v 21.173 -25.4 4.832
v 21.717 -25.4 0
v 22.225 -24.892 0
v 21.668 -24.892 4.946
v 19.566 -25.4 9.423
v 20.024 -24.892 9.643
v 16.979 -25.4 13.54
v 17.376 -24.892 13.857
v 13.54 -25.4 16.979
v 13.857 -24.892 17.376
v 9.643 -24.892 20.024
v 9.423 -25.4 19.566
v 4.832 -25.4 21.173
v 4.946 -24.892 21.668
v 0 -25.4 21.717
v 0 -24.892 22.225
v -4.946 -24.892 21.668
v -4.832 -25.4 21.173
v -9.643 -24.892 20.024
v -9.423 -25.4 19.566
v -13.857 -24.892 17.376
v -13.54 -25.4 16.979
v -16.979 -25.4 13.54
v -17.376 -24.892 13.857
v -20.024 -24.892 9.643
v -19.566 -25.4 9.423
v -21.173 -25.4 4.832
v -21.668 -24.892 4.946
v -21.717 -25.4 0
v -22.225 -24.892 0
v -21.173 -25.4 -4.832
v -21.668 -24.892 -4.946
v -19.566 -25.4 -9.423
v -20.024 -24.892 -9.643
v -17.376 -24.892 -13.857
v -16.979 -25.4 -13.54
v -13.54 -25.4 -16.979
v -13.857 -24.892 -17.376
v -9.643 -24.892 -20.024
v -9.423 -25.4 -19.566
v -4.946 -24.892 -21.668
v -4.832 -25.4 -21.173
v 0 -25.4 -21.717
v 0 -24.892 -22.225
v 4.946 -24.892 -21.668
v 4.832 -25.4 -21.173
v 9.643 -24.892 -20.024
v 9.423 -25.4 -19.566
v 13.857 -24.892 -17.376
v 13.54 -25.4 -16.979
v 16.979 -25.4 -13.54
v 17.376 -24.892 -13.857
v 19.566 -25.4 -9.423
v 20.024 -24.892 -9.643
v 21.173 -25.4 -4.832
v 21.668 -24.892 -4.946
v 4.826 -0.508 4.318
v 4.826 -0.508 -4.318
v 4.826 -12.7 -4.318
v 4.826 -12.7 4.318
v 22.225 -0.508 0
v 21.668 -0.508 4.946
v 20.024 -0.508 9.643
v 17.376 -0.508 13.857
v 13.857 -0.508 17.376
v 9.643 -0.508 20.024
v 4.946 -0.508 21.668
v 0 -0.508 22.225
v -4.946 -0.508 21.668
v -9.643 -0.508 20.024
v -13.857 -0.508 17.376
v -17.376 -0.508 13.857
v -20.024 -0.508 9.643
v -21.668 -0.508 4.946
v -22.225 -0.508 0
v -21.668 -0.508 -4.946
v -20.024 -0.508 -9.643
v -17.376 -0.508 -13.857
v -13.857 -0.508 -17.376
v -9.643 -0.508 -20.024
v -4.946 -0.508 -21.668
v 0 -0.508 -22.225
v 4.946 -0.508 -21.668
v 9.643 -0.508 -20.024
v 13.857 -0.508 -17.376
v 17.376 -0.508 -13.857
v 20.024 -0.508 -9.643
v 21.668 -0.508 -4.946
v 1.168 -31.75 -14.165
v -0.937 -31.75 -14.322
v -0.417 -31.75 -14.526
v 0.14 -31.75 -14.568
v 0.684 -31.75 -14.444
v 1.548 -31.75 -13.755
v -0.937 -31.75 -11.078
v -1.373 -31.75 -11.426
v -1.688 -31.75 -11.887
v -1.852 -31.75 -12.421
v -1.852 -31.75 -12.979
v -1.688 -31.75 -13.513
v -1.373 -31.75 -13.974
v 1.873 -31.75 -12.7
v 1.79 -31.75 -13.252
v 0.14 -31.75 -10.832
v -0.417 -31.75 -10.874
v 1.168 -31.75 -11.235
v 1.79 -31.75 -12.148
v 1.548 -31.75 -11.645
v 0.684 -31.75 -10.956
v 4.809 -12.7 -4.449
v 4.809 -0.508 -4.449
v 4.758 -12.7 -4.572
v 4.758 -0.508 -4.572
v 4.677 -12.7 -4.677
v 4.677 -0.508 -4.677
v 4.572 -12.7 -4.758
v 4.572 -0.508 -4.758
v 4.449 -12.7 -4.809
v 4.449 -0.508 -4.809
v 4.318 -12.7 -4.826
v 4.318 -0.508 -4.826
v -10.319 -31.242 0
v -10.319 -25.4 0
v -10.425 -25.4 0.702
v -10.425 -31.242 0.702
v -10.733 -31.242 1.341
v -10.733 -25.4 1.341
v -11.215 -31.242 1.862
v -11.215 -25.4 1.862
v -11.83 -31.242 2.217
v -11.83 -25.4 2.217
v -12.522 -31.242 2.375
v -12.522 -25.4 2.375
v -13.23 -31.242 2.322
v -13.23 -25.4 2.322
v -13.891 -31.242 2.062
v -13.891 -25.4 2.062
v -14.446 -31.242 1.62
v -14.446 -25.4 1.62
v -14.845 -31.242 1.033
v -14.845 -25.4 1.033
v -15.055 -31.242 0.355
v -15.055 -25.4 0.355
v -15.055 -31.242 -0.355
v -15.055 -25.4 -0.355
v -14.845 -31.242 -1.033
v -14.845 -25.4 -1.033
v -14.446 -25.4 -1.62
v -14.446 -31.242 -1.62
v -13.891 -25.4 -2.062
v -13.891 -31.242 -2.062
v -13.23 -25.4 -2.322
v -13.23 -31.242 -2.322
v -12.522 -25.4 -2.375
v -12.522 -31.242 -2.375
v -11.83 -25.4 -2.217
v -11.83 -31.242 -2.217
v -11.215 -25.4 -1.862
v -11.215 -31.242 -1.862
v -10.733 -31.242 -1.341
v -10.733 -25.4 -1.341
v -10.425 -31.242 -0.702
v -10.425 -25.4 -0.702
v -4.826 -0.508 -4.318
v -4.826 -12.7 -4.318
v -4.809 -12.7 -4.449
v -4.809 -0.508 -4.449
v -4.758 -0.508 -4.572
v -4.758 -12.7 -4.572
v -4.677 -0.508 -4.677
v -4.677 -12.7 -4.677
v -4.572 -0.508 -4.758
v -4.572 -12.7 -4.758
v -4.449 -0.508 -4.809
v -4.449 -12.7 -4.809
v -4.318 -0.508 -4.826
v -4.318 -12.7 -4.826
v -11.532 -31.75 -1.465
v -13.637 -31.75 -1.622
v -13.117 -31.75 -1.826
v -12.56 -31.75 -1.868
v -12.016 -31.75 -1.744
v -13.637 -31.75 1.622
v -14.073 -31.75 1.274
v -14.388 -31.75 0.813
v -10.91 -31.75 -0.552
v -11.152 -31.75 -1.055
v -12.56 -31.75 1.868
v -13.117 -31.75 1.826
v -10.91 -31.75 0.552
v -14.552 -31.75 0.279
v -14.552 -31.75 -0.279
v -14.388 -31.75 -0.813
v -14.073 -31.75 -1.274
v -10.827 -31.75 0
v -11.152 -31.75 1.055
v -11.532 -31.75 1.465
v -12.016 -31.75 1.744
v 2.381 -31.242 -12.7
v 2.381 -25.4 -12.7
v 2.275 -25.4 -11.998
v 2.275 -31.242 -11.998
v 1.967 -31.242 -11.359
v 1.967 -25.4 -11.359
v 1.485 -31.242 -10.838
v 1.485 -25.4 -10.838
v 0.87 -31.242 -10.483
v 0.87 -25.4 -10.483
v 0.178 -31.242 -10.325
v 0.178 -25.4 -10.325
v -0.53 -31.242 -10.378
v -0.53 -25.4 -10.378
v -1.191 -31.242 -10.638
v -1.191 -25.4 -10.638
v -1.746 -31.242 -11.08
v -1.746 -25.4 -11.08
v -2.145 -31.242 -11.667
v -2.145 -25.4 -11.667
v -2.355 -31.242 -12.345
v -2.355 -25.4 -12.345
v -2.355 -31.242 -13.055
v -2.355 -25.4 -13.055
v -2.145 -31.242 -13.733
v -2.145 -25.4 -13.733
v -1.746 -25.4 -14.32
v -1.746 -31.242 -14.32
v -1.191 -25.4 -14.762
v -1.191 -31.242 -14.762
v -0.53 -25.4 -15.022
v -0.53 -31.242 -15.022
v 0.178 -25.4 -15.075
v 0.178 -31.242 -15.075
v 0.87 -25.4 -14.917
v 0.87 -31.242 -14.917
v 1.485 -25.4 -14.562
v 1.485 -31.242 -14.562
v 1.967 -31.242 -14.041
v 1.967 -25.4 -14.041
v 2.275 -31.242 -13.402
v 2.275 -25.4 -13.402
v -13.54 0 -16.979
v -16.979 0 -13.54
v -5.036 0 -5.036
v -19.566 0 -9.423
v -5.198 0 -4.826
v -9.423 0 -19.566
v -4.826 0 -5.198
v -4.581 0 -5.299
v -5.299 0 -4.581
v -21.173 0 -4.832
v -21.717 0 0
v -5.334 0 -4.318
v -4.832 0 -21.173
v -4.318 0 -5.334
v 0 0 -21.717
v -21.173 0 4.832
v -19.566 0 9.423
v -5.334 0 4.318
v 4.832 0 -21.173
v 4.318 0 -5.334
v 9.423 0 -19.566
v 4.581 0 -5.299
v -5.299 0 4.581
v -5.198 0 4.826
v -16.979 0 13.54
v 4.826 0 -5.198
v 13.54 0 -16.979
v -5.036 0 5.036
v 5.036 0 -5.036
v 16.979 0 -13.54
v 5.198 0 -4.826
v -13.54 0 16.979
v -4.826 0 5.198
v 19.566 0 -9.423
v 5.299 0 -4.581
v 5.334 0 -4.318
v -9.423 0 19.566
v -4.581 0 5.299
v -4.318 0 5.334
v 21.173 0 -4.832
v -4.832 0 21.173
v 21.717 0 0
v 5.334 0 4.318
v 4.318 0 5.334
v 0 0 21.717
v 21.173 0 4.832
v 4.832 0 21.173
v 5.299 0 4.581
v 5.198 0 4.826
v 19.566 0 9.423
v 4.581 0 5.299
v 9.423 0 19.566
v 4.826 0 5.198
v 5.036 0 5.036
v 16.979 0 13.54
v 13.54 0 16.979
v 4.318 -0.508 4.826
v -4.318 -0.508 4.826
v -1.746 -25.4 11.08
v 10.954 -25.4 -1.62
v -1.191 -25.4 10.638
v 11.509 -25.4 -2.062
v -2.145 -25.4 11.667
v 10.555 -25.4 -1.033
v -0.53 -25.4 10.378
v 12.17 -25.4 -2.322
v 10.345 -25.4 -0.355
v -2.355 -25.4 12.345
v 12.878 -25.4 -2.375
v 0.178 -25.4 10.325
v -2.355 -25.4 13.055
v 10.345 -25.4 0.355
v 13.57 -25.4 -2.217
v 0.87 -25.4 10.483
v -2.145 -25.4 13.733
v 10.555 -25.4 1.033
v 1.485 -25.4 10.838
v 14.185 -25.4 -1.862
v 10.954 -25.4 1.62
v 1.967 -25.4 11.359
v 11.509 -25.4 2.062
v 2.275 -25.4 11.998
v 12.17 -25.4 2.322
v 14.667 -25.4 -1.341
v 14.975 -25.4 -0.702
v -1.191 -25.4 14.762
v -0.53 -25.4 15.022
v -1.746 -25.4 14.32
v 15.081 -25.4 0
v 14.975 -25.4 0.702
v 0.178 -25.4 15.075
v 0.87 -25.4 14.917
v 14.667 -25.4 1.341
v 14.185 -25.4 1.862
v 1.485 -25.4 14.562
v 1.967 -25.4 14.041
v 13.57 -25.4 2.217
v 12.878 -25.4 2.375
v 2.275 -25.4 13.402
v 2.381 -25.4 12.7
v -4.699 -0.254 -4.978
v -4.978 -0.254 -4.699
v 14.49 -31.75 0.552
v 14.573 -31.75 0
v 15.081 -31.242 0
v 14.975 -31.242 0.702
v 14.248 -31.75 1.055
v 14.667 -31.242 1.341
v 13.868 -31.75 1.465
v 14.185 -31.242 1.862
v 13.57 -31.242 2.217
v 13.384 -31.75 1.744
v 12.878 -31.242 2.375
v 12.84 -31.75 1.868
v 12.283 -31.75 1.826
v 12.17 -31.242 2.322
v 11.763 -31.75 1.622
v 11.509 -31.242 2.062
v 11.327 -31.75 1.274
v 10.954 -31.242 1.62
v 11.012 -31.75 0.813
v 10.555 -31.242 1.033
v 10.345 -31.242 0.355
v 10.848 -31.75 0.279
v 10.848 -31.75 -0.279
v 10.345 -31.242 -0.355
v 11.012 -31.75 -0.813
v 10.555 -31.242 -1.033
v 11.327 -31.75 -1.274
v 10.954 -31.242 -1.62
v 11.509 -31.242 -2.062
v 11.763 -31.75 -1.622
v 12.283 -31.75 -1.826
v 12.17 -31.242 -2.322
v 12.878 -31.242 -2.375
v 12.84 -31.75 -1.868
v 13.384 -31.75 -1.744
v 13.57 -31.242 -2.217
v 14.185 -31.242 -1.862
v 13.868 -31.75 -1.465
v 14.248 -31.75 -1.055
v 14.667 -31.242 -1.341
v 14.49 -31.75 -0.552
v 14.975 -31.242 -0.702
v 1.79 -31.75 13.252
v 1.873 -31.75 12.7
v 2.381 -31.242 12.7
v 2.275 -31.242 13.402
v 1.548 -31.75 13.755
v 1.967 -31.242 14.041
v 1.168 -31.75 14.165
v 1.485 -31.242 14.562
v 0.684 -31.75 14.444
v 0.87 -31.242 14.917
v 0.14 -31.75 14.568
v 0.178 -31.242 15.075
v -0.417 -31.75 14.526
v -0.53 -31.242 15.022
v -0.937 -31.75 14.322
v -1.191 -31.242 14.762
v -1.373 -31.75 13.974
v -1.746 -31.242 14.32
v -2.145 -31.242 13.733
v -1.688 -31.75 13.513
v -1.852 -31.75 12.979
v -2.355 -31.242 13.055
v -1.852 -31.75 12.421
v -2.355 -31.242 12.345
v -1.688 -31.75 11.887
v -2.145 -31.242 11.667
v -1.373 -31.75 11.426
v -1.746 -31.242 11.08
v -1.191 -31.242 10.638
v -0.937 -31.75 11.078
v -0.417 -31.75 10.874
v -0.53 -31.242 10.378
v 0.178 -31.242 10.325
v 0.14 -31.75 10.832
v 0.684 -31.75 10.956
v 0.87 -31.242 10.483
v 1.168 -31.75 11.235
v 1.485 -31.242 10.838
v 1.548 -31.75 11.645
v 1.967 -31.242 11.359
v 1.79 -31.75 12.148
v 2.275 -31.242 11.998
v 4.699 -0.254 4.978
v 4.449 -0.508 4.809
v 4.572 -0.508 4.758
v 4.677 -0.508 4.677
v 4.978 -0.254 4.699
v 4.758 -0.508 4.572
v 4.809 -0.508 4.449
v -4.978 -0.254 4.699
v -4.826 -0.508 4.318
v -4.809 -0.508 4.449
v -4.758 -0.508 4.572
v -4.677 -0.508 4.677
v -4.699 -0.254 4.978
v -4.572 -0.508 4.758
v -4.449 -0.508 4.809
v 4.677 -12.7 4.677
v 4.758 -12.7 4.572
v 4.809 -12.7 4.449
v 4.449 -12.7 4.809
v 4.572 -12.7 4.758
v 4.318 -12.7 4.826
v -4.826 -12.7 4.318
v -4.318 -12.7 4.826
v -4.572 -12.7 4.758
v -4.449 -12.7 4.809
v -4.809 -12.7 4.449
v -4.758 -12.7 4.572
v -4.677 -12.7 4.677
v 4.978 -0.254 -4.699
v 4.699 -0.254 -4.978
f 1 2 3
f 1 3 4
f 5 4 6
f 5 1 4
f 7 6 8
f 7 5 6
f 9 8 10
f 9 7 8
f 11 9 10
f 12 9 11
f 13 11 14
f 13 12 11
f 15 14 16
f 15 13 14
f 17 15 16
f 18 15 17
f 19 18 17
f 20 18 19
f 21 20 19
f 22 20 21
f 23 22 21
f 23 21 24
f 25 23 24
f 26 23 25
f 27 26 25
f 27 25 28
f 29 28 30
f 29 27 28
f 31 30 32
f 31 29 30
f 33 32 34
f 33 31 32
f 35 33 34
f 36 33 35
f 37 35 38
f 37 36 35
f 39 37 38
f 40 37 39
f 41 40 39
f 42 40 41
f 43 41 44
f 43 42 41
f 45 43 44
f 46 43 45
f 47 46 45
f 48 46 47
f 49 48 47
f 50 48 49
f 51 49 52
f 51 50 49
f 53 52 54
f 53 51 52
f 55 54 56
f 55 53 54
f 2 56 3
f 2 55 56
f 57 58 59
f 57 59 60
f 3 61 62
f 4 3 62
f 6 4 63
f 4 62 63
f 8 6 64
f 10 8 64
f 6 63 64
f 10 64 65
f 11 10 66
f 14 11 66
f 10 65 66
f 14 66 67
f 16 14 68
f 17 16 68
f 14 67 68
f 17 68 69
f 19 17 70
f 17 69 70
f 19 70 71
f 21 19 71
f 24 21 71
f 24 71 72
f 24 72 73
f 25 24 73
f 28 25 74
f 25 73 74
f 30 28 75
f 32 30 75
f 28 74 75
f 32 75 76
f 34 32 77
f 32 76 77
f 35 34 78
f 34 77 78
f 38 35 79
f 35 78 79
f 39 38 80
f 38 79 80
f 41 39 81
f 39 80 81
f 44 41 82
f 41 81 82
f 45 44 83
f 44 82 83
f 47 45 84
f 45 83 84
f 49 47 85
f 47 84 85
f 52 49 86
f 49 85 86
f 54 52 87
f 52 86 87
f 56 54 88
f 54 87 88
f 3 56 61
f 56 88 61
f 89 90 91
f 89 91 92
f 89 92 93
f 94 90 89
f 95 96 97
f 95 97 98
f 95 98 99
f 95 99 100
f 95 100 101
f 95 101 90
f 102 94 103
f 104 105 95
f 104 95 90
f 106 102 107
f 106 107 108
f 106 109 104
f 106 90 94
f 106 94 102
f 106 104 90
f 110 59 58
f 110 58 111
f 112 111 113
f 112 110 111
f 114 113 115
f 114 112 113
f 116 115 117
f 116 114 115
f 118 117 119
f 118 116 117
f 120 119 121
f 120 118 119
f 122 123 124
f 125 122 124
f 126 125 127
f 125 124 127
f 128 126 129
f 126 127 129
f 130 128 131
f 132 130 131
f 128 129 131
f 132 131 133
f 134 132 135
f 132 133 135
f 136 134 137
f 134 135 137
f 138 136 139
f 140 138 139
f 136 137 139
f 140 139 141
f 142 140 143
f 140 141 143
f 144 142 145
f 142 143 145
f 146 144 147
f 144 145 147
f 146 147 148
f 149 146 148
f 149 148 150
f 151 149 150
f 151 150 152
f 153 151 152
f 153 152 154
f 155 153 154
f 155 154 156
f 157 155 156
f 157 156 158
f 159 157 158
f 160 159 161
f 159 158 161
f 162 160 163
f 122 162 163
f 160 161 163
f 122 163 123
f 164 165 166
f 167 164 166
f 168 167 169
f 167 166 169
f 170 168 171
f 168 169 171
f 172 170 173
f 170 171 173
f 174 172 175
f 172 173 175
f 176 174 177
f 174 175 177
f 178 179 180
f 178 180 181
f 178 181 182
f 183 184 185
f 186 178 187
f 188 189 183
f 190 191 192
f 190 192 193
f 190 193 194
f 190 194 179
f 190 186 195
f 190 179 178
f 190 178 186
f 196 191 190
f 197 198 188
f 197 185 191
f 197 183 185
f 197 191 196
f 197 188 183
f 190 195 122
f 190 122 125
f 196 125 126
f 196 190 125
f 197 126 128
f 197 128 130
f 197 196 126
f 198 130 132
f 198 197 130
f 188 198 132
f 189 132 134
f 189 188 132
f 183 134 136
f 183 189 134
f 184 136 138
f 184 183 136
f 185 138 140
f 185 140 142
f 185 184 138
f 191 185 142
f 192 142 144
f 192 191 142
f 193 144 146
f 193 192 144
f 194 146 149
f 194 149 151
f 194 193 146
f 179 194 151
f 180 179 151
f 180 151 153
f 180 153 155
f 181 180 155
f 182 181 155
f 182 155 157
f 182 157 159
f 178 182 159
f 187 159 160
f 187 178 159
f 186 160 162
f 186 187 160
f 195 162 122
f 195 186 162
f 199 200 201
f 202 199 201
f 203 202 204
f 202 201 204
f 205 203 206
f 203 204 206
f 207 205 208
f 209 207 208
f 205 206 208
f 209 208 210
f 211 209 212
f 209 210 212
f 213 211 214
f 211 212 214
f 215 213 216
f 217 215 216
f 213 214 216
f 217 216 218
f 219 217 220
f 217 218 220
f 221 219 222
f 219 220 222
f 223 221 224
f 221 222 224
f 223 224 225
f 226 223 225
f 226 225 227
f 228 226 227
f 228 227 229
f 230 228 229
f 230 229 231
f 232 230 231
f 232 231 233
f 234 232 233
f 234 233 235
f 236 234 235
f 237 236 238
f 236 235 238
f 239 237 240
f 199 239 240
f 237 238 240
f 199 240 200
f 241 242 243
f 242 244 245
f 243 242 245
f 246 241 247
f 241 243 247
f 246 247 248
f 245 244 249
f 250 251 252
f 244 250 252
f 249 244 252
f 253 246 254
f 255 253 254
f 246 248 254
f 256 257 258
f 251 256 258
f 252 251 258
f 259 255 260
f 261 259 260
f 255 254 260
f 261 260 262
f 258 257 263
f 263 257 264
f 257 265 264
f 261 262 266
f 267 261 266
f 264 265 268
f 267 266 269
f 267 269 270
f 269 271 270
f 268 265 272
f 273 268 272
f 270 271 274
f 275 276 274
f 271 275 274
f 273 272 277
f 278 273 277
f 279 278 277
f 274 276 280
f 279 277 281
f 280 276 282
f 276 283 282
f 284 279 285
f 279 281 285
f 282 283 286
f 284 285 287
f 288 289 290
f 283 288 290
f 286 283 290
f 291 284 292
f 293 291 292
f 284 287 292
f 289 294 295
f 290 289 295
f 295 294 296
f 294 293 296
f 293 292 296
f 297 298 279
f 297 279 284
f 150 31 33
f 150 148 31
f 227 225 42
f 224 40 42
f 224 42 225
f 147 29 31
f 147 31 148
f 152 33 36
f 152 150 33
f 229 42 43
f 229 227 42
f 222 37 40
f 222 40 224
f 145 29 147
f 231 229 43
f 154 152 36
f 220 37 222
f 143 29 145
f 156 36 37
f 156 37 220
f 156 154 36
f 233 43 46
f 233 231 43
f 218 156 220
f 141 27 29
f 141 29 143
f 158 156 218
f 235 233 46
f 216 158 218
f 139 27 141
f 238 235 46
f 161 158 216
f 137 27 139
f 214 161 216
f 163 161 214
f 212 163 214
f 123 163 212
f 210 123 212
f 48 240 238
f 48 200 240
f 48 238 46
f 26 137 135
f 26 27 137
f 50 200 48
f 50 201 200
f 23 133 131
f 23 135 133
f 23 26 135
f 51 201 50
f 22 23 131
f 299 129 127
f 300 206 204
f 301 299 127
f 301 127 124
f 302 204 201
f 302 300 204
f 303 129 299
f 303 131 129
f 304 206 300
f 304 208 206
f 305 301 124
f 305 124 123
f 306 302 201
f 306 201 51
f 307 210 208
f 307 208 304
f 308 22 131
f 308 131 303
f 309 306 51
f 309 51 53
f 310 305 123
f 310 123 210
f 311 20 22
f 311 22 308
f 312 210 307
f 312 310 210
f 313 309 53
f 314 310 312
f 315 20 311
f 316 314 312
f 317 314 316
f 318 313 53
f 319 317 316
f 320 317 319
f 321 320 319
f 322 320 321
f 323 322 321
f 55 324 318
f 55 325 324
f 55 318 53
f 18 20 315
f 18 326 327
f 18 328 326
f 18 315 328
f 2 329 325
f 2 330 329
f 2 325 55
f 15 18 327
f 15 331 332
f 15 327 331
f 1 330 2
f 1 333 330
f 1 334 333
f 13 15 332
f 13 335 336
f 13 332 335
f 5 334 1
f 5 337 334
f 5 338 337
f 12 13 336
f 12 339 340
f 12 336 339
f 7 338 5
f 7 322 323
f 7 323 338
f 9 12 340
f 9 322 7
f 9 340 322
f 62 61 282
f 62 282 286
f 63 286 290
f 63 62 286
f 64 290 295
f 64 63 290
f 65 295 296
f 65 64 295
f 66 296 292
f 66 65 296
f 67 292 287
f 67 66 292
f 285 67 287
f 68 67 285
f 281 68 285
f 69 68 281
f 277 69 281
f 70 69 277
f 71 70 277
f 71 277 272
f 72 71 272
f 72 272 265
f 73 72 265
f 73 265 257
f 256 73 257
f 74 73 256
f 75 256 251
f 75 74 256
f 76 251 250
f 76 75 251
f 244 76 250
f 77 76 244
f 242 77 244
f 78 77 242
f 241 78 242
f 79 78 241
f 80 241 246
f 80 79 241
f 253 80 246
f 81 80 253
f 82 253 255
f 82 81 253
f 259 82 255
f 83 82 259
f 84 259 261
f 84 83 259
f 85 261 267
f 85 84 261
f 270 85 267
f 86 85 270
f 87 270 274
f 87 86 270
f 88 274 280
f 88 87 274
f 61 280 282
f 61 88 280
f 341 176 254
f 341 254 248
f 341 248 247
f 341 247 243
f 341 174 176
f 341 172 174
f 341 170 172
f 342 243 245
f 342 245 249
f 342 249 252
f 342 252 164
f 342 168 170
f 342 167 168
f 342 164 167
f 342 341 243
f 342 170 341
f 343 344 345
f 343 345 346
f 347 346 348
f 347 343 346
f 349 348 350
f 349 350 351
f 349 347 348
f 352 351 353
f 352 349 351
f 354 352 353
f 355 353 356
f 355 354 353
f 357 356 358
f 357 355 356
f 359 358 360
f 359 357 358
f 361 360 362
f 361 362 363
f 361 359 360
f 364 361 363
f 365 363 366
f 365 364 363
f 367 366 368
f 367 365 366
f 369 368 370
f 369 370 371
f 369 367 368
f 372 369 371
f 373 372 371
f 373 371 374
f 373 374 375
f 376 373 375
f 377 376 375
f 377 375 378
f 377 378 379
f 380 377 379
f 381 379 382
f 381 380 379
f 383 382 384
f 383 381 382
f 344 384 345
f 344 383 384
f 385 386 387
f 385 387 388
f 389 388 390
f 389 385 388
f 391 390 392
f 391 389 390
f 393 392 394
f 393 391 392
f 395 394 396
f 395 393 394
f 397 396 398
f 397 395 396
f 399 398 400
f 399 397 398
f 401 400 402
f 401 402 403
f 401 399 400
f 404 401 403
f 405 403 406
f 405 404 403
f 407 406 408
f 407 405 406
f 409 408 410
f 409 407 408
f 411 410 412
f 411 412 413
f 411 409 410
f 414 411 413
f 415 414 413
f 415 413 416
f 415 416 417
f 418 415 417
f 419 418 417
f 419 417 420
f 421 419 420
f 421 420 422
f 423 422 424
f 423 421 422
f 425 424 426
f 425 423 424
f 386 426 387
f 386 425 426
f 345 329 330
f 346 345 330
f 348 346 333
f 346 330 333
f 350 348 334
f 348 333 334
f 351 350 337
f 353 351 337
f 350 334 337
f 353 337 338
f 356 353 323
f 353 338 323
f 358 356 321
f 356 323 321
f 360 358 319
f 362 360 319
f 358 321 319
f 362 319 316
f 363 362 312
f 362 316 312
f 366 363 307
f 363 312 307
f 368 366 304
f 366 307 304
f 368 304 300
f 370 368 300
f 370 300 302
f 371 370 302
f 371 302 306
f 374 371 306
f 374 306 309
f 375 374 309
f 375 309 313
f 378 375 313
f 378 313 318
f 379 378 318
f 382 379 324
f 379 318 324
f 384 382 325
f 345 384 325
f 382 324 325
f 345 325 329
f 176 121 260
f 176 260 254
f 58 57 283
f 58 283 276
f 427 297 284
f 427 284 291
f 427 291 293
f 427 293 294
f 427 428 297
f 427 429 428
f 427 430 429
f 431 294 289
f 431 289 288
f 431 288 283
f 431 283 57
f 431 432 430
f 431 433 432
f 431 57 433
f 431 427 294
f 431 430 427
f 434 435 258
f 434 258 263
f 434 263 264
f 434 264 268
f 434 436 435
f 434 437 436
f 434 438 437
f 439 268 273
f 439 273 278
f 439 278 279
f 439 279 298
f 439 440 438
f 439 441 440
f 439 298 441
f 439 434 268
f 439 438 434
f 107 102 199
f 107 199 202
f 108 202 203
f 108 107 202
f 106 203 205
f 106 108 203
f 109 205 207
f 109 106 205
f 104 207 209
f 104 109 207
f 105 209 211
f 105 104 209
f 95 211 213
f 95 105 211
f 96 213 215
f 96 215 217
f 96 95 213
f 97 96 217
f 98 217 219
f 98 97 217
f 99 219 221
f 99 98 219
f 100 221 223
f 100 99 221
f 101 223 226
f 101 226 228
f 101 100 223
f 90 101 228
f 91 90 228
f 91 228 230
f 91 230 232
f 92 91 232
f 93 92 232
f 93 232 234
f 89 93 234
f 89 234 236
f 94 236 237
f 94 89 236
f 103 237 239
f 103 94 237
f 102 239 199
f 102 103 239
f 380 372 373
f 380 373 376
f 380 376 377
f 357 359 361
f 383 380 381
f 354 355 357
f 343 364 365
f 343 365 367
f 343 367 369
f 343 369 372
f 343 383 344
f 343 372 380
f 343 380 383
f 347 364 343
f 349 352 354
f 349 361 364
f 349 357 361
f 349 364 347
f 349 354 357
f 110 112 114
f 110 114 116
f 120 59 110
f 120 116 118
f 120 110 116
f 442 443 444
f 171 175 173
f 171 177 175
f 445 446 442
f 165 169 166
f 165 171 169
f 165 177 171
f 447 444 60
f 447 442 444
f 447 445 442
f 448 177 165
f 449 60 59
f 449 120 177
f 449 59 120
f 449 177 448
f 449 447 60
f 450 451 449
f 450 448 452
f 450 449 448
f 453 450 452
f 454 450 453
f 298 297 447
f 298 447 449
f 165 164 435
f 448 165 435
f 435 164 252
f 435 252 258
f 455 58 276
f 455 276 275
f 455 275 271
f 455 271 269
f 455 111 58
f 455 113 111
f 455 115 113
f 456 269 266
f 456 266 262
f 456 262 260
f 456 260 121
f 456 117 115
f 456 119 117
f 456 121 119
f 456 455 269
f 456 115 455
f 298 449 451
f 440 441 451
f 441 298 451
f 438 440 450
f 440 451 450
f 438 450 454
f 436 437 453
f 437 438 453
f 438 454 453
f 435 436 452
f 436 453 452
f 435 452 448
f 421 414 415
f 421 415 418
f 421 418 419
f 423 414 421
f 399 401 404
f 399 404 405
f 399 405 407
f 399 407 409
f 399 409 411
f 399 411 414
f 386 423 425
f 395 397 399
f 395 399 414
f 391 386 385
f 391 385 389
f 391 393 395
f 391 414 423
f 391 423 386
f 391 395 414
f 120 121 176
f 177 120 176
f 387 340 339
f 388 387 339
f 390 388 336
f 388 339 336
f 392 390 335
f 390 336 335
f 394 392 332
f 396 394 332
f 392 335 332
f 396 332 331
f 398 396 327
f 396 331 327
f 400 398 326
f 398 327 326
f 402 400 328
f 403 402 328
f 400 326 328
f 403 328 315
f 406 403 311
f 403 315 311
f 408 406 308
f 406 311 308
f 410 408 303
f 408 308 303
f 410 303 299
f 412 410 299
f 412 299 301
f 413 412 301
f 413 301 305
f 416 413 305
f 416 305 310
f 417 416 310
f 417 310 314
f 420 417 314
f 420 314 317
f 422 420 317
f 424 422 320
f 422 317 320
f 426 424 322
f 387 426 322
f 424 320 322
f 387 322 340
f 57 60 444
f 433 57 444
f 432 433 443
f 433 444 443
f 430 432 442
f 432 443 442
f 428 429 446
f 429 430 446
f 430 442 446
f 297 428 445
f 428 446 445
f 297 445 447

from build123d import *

# Parameters (mm, degrees)
F0_R     = 22.225
F1_DEPTH = 25.4
F2_R     = 2.38125
F3_DEPTH = 6.35
F4_W     = 9.652
F4_H     = 9.652
F5_DEPTH = 12.7
F6_R     = 0.508
F7_SIZE  = 0.508


with BuildPart() as f1:
    # F0 (on Front) → F1 (new body)
    with BuildSketch(Plane.XZ):
        Circle(F0_R)
    extrude(amount=F1_DEPTH)

    # F2 (on face) → F3 (join)
    with BuildSketch(Plane.XZ.offset(25.4)):
        with Locations((0, 12.7)):
            Circle(F2_R)
        with Locations((-12.7, 0)):
            Circle(F2_R)
        with Locations((0, -12.7)):
            Circle(F2_R)
        with Locations((12.7, 0)):
            Circle(F2_R)
    extrude(amount=F3_DEPTH)

    # F4 (on face) → F5 (cut)
    with BuildSketch(Plane(origin=(0, 0, 0), x_dir=(-1, 0, 0), z_dir=(0, 1, 0))):
        Rectangle(F4_W, F4_H)
    extrude(amount=-F5_DEPTH, mode=Mode.SUBTRACT)

    # F6
    f6_edges = [f1.edges().sort_by_distance(p)[0] for p in [
        (-4.826, -6.35, -4.826),
        (-4.826, -6.35, 4.826),
        (4.826, -6.35, 4.826),
        (4.826, -6.35, -4.826),
    ]]
    fillet(f6_edges, radius=F6_R)

    # F7
    f7_edges = [f1.edges().sort_by_distance(p)[0] for p in [
        (0, 0, -4.826),
        (-22.225, 0, 0),
        (-22.225, -25.4, 0),
        (-15.08125, -31.75, 0),
        (-2.38125, -31.75, 12.7),
        (10.31875, -31.75, 0),
        (-2.38125, -31.75, -12.7),
    ]]
    chamfer(f7_edges, length=F7_SIZE)


solid = f1.part
